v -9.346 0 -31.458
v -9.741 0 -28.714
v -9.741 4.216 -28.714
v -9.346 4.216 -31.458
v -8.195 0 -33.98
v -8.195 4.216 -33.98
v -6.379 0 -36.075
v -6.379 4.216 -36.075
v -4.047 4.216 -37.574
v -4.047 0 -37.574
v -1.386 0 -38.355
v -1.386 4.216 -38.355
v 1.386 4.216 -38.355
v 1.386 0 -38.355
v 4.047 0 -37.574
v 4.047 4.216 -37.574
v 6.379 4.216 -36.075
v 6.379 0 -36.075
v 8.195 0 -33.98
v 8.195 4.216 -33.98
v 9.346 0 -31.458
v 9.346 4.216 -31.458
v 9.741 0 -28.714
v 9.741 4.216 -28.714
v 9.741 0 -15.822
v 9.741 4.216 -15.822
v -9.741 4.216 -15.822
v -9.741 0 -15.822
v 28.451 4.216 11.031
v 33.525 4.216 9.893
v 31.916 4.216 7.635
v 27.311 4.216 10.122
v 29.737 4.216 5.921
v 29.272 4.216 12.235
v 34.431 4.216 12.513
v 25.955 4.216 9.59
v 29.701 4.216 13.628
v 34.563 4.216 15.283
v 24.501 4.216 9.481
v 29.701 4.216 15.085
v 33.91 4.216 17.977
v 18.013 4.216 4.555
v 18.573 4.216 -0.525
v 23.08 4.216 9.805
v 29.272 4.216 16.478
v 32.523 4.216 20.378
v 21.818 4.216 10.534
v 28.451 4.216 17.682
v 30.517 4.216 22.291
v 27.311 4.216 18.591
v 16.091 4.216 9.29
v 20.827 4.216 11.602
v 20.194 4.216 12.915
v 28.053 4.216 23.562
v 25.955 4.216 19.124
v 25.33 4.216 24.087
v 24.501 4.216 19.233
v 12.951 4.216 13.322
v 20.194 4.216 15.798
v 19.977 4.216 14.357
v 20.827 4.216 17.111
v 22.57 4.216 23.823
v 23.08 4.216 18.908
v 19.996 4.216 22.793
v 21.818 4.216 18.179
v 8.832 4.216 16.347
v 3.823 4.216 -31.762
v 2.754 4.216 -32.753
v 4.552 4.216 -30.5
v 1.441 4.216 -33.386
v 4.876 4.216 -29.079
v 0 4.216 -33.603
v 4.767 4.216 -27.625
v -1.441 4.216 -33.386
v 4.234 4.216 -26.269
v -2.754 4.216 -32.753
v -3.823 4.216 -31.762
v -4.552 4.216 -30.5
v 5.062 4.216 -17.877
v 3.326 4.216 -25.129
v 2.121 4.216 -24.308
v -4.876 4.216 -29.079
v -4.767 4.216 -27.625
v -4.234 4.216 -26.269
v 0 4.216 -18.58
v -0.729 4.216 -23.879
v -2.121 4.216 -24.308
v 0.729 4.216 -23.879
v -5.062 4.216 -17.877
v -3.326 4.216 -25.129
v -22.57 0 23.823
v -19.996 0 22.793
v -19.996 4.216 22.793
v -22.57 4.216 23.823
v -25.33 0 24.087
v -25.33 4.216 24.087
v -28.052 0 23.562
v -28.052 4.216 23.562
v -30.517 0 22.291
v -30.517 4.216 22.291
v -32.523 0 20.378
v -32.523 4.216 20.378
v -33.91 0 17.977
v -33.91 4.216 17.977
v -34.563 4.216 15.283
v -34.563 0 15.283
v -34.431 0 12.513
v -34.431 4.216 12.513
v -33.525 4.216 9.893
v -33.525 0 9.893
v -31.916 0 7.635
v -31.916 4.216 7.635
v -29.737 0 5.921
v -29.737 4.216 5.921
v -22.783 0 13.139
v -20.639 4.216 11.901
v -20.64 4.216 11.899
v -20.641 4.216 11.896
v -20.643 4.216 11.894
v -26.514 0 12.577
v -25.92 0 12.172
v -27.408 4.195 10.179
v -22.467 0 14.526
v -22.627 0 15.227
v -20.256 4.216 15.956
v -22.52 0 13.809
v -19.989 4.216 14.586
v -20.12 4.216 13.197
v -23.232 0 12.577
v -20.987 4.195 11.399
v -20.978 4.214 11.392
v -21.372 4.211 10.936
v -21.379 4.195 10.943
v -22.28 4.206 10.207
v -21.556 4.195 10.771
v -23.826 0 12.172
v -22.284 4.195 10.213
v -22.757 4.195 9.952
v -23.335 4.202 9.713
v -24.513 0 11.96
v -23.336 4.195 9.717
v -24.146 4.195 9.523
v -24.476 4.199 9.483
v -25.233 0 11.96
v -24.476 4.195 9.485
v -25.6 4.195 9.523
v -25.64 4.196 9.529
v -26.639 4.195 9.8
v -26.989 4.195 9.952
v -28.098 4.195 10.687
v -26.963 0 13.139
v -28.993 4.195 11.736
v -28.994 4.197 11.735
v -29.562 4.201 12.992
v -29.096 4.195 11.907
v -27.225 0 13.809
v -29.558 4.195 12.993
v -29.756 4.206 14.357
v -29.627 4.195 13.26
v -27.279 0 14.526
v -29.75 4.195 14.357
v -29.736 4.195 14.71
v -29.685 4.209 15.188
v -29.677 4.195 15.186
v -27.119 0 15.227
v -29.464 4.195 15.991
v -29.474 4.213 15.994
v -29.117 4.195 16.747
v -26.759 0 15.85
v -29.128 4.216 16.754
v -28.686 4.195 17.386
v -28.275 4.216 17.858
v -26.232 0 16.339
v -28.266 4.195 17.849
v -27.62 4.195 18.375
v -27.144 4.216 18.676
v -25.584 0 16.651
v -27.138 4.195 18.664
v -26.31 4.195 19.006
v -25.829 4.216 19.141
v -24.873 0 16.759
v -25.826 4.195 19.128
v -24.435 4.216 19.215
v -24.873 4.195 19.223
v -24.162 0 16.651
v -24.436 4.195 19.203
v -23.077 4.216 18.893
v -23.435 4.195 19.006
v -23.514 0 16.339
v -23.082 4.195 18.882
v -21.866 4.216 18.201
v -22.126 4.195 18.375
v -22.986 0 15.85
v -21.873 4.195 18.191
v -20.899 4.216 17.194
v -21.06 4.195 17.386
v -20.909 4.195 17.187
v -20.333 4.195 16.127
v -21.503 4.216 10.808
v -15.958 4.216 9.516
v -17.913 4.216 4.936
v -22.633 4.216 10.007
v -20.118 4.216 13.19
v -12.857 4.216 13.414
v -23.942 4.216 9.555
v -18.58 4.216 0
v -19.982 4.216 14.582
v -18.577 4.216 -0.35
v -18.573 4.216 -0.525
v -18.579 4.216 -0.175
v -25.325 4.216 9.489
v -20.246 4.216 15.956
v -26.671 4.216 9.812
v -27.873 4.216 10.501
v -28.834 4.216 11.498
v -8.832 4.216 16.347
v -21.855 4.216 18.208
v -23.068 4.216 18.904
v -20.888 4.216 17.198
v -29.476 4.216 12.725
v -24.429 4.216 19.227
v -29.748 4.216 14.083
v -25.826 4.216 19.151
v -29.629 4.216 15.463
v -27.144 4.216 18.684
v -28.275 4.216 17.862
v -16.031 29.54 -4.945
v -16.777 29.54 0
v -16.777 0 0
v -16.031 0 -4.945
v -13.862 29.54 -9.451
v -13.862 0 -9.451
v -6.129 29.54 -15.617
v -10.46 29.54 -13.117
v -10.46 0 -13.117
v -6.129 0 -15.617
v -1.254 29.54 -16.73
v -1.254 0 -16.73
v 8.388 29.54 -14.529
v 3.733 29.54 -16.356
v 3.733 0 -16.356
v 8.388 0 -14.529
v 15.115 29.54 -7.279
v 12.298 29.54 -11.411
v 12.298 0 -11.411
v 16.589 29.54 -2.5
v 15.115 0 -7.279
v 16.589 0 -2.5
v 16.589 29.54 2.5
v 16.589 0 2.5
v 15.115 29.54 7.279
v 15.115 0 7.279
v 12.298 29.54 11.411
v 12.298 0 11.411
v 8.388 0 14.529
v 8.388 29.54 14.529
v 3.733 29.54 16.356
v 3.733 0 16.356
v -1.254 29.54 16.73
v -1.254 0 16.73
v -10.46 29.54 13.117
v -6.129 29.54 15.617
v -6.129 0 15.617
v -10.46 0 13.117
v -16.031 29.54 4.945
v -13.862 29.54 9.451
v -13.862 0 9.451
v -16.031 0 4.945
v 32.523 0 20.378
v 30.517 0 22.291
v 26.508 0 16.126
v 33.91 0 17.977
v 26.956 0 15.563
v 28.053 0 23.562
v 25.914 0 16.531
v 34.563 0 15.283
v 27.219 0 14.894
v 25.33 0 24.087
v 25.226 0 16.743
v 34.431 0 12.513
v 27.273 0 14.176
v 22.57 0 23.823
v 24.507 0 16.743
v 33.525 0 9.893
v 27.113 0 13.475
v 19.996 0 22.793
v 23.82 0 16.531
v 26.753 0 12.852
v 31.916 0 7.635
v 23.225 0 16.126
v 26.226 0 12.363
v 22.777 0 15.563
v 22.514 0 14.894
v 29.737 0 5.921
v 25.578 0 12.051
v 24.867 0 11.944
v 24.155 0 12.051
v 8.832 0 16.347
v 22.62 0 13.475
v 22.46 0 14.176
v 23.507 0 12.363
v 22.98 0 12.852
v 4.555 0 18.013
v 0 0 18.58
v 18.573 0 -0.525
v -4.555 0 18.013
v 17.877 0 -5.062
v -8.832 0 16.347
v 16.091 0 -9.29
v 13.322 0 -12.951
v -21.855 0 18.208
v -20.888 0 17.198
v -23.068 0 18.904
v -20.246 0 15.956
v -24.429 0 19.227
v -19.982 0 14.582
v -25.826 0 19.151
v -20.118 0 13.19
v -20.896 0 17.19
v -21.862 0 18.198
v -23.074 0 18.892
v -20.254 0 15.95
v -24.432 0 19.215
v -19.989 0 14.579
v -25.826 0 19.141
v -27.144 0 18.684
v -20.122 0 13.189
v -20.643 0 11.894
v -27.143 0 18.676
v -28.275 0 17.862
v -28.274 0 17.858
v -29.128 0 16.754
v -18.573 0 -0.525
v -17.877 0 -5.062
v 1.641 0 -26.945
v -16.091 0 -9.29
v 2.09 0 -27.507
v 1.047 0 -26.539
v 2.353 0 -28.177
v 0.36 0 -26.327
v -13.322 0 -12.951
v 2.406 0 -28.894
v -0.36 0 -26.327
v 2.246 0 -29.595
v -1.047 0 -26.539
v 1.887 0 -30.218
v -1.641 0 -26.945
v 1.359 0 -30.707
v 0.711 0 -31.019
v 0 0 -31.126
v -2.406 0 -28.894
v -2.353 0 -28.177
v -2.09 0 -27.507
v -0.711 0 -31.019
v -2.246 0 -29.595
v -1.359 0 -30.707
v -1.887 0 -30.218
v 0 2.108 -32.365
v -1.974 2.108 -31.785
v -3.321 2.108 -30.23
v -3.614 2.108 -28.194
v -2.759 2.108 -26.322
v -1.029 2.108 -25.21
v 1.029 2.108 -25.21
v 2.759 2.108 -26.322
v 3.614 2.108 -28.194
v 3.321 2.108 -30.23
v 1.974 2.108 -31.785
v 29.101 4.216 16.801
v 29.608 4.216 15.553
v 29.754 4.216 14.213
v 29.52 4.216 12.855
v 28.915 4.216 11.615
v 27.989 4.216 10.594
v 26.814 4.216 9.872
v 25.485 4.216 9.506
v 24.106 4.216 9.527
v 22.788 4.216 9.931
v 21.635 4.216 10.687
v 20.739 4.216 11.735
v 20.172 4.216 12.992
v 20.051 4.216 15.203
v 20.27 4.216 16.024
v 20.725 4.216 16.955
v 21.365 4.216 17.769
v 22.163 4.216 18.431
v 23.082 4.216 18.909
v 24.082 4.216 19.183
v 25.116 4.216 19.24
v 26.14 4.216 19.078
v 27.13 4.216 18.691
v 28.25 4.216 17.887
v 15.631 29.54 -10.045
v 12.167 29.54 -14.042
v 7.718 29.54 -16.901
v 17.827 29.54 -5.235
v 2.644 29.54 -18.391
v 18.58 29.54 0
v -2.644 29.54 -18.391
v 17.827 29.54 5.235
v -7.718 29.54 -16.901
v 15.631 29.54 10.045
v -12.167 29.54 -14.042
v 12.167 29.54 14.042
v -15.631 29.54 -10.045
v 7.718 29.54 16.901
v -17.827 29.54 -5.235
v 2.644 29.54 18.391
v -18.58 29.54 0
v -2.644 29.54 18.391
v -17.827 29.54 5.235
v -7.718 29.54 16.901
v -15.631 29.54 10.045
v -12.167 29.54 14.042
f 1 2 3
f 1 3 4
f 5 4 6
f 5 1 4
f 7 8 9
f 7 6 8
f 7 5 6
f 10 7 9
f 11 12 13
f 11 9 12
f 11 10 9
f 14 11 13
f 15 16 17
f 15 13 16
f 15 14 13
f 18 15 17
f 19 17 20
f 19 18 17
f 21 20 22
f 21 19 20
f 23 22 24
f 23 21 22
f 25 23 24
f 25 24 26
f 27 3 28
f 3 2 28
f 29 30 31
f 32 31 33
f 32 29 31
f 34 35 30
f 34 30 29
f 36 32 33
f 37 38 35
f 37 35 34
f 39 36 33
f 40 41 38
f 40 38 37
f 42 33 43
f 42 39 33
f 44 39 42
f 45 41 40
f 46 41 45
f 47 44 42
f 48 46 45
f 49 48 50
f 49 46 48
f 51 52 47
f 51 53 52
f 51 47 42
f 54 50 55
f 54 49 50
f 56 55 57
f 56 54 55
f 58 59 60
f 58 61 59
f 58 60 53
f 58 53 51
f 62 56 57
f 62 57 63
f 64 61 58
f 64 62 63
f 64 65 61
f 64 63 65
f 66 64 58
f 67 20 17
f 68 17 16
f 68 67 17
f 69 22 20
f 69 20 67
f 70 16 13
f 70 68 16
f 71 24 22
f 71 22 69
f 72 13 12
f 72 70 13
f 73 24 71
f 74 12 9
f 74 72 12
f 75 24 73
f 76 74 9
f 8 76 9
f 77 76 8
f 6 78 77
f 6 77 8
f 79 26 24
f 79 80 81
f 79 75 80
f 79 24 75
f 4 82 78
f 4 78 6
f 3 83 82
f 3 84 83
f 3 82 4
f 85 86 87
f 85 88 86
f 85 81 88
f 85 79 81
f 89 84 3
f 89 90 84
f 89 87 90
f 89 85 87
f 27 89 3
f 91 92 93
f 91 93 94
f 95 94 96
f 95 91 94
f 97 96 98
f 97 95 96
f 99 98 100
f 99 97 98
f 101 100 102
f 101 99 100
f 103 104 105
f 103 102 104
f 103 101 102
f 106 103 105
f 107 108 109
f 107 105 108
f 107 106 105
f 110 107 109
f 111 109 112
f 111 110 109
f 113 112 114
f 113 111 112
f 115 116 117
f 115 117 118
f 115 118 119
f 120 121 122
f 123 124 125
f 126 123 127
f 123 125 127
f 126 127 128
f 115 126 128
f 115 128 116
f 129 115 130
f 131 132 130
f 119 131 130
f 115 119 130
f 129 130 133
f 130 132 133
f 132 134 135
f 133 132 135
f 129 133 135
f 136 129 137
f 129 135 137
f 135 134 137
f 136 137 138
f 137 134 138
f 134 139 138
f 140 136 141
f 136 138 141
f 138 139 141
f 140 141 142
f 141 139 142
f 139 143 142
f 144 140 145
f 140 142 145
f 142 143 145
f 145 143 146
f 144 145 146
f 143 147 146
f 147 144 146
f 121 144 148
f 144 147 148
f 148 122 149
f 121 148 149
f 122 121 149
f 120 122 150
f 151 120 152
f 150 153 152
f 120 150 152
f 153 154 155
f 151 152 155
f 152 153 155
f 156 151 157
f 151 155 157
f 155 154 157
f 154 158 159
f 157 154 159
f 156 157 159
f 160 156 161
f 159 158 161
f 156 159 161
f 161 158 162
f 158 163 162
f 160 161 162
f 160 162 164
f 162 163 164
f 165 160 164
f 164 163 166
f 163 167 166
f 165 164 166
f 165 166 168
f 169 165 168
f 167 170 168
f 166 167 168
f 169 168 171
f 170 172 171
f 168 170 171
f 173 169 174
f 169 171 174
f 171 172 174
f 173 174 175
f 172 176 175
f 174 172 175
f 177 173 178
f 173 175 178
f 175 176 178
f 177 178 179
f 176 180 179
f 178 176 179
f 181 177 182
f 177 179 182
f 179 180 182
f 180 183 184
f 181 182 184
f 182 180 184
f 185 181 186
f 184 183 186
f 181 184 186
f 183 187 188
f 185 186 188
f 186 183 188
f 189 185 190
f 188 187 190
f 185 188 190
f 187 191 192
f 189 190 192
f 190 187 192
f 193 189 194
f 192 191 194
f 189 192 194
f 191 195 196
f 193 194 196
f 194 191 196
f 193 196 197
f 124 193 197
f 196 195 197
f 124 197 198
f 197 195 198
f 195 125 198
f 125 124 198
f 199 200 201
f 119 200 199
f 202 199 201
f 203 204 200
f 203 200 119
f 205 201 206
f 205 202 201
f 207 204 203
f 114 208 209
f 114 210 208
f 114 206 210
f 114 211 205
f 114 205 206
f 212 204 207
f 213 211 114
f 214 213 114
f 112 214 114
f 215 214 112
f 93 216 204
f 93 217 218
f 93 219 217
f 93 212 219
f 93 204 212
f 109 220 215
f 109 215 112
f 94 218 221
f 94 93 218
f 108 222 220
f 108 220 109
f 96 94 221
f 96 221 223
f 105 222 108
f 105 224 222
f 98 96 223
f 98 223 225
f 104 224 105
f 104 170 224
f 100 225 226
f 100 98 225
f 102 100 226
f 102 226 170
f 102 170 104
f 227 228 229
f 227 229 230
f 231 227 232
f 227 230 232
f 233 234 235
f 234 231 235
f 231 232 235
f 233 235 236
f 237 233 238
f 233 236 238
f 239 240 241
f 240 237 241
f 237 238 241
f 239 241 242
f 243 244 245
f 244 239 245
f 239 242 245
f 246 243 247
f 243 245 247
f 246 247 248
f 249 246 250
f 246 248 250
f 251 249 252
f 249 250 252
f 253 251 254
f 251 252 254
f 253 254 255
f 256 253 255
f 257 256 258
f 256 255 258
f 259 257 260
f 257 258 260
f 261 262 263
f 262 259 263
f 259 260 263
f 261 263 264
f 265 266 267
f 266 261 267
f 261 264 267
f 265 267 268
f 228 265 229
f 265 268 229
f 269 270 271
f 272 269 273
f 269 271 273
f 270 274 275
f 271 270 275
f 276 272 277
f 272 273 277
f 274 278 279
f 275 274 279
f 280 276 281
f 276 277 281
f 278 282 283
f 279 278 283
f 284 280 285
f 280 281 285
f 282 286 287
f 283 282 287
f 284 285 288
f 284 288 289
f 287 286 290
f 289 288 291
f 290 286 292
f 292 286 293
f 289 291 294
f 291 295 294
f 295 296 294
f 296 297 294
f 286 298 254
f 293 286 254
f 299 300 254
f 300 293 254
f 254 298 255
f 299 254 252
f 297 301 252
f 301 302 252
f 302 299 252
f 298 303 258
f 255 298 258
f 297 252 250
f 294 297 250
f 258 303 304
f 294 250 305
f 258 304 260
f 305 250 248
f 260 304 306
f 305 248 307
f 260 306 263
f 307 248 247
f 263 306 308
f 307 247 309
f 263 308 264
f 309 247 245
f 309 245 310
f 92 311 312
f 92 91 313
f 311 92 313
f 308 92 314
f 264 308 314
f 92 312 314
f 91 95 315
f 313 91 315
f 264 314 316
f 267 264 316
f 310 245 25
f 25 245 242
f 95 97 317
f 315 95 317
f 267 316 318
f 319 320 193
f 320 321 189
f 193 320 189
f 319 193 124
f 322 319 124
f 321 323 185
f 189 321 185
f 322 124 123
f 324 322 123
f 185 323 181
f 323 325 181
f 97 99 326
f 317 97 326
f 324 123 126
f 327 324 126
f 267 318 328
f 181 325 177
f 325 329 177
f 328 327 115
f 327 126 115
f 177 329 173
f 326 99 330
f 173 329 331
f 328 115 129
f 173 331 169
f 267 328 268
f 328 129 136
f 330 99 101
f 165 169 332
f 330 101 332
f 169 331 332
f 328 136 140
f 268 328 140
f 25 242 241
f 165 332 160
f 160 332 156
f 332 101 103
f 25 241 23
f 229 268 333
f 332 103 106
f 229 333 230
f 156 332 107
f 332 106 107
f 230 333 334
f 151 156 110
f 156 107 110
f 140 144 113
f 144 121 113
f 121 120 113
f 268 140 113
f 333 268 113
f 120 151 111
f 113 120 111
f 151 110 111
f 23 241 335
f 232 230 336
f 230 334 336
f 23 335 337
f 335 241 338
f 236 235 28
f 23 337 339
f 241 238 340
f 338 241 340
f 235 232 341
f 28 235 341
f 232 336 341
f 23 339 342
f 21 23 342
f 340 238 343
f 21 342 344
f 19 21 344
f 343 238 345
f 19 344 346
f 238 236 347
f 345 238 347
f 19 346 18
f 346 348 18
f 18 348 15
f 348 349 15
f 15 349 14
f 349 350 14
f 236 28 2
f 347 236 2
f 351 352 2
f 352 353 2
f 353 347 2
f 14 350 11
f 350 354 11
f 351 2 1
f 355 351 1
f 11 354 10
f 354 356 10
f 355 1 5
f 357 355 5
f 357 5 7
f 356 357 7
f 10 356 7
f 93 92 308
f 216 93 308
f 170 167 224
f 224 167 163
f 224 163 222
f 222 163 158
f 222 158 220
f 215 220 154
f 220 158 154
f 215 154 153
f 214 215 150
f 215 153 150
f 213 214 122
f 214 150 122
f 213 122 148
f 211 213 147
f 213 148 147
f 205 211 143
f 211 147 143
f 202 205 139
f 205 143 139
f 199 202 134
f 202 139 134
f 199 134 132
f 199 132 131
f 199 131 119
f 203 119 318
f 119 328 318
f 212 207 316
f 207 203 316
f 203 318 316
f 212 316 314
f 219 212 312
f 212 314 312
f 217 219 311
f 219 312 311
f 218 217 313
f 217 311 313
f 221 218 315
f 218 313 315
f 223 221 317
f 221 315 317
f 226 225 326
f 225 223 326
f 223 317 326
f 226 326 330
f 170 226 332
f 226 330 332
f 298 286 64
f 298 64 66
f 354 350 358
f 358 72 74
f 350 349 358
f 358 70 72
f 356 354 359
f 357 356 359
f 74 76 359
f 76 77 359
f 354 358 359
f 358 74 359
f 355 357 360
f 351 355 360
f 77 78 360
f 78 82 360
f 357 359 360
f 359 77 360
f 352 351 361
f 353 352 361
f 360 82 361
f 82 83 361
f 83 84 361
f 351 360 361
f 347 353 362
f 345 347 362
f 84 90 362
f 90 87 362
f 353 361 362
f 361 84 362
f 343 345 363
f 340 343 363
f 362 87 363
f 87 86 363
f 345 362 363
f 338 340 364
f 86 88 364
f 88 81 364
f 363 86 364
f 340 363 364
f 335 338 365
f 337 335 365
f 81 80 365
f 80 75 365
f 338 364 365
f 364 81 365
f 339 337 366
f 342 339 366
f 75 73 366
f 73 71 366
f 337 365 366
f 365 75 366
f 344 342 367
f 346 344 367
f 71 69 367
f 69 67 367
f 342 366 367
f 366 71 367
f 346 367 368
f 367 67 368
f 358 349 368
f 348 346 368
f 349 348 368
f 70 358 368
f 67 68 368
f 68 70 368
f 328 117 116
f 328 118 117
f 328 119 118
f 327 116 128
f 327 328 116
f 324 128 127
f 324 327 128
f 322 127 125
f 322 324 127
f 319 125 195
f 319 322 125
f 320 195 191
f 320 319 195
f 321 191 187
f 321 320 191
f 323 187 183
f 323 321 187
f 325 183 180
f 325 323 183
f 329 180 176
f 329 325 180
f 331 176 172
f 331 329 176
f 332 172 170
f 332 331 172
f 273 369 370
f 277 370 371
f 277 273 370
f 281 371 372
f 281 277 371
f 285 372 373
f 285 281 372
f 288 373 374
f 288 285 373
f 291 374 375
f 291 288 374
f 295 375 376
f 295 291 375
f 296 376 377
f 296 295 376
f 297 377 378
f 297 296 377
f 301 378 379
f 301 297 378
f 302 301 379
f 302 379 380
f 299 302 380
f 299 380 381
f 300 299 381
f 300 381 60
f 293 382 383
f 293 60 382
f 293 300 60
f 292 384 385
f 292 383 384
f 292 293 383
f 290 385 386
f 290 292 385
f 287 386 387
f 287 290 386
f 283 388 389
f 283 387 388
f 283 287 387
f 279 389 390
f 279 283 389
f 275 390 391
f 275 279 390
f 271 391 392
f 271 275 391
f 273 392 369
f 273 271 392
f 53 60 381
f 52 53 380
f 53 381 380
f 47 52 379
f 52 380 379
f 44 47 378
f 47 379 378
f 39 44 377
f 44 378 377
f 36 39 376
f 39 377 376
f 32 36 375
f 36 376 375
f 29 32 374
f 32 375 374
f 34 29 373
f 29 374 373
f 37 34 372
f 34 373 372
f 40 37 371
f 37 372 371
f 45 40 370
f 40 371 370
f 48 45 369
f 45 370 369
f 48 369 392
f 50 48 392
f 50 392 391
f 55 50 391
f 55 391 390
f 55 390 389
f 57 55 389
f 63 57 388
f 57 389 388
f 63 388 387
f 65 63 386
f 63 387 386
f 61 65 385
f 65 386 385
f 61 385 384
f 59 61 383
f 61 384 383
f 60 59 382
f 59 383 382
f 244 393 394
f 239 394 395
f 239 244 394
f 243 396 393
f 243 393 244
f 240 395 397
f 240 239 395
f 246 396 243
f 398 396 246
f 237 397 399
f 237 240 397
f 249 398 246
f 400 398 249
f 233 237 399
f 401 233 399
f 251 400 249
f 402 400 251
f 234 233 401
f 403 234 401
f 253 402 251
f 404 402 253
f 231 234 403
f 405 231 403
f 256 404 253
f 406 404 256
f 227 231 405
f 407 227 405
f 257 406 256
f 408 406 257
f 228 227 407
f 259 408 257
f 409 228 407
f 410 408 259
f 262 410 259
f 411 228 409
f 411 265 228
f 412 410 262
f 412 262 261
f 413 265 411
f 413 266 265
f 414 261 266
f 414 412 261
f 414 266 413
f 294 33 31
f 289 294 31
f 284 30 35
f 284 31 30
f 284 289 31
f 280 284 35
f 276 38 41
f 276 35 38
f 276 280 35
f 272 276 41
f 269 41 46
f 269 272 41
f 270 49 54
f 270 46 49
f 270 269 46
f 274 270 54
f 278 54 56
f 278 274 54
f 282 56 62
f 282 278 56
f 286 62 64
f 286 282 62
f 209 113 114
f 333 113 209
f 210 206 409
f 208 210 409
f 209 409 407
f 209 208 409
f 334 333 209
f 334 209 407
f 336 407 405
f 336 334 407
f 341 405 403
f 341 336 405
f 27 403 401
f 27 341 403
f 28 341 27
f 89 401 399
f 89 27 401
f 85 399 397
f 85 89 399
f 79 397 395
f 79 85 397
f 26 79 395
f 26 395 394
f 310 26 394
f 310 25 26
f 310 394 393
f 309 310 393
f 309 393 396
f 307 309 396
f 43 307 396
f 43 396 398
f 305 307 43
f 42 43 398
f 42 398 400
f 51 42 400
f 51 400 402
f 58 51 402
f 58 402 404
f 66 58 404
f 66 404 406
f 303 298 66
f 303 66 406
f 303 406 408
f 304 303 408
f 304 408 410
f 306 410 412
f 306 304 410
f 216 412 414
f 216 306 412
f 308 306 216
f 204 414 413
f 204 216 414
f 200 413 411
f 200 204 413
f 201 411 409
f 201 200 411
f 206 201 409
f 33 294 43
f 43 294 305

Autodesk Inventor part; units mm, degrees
ref_plane "YZ Plane" through (0, 0, 0) normal (1, 0, 0) x (0, 1, 0)
ref_plane "XZ Plane" through (0, 0, 0) normal (0, 1, 0) x (-1, 0, 0)
sketch "Sketch1" plane through (0, 0, 0) normal (0, 1, 0) x (-1, 0, 0)
  circle A0 centre (0, 0) radius 16.7767
  circle A1 centre (0, 0) radius 18.5801
  circle A2 centre (-24.8666, 14.3567) radius 2.413
  circle A3 centre (-24.8666, 14.3567) radius 4.8895
  line L0 (-29.7371, 5.9209) -> (-18.5727, -0.5249)
  line L1 (-19.9962, 22.7926) -> (-8.8318, 16.3469)
  arc A4 (-19.9962, 22.7926) -> (-29.7371, 5.9209) centre (-24.8666, 14.3567) ccw
  circle A5 centre (0, -28.7135) radius 2.413
  circle A6 centre (0, -28.7135) radius 4.8895
  line L2 (-9.7409, -28.7135) -> (-9.7409, -15.822)
  arc A7 (-9.7409, -28.7135) -> (9.7409, -28.7135) centre (0, -28.7135) ccw
  line L3 (9.7409, -28.7135) -> (9.7409, -15.822)
  circle A8 centre (24.8666, 14.3567) radius 2.413
  circle A9 centre (24.8666, 14.3567) radius 4.8895
  line L4 (29.7371, 5.9209) -> (18.5727, -0.5249)
  arc A10 (29.7371, 5.9209) -> (19.9961, 22.7926) centre (24.8666, 14.3567) ccw
  line L5 (19.9961, 22.7926) -> (8.8318, 16.3469)
  point P0 (0, 14.3567)
  point P1 (-16.0908, 9.29)
extrude "Extrusion1" add sketch "Sketch1" along normal blind 29.5402 contours A1
extrude "Extrusion2" add sketch "Sketch1" along normal blind 4.2164 contours A1 L0 A4 L1
extrude "Extrusion3" add sketch "Sketch1" along normal blind 4.2164 contours A1 L5 A10 L4
extrude "Extrusion4" add sketch "Sketch1" along normal blind 4.2164 contours L3 A7 L2 A1
sketch "Sketch2" plane through (0, 4.2164, 0) normal (0, 1, 0) x (1, 0, 0)
  arc A0 (-29.7371, -5.9209) -> (-19.9961, -22.7926) centre (-24.8666, -14.3567) ccw projected
  line L0 (-19.9961, -22.7926) -> (-8.8318, -16.3469) projected
  arc A1 (-18.5727, 0.5249) -> (-8.8318, -16.3469) centre (0, 0) ccw projected
  line L1 (-18.5727, 0.5249) -> (-29.7371, -5.9209) projected
  circle A2 centre (24.8666, -14.3567) radius 4.8895 projected
  circle A3 centre (0, 28.7135) radius 4.8895 projected
  arc A4 (9.7409, 28.7135) -> (-9.7409, 28.7135) centre (0, 28.7135) ccw projected
  line L2 (9.7409, 15.822) -> (9.7409, 28.7135) projected
  line L3 (-9.7409, 28.7135) -> (-9.7409, 15.822) projected
  circle A5 centre (0, 28.7135) radius 2.413 projected
  line L4 (29.7371, -5.9209) -> (18.5727, 0.5249) projected
  arc A6 (19.9962, -22.7926) -> (29.7371, -5.9209) centre (24.8666, -14.3567) ccw projected
  circle A7 centre (24.8666, -14.3567) radius 2.413 projected
  line L5 (8.8318, -16.3469) -> (19.9962, -22.7926) projected
  circle A8 centre (0, 0) radius 18.5801 projected
  circle A9 centre (0, 0) radius 16.7767 projected
ref_plane "Work Plane1" through (-13.7086, 0, 7.9) normal (0.5, 0, 0.866) x (0.866, 0, -0.5)
sketch "Sketch3" plane through (-13.7086, 0, 7.9) normal (0.5, 0, 0.866) x (0.866, 0, -0.5)
  line L0 (-10.4785, 0) -> (-15.3045, 0) projected
  line L1 (-10.4785, 0) -> (-8.002, 4.2164)
  line L2 (-8.002, 4.2164) -> (-8.002, 0)
  line L3 (-8.002, 0) -> (-8.002, 4.2164) projected
  line L4 (-8.002, 0) -> (-10.4785, 0)
  line L5 (-12.8915, 0) -> (-12.8915, 4.2164) projected
  line L6 (-12.8915, 0) -> (-12.8915, 8.5631)
  point P0 (15.822, 0)
revolve "Revolution1" add sketch "Sketch3" angle 360 about axis through (-24.8729, 0, 14.3457) along (0, 1, 0)
ref_plane "Work Plane2" through (0, 0, 0) normal (0.5, 0, -0.866) x (0, 1, 0)
sketch "Sketch4" plane through (0, 0, 0) normal (0.5, 0, -0.866) x (0, 1, 0)
  line L0 (0, 26.3005) -> (0, 31.1265) projected
  line L1 (4.2164, 33.603) -> (4.2164, 23.824) projected
  line L2 (4.2164, 33.603) -> (0, 31.1265)
  line L3 (0, 23.824) -> (0, 33.603) projected
  line L4 (0, 31.1265) -> (0, 33.603)
  line L5 (0, 33.603) -> (4.2164, 33.603)
  line L6 (0, 28.7135) -> (10.3946, 28.7135)
  point P0 (0, 0)
revolve "Revolution2" add sketch "Sketch4" angle 360 about axis through (24.8666, 0, 14.3567) along (0, 1, 0) contours L3 L5 L2
ref_plane "Work Plane3" through (0, 0, 0) normal (-1, 0, 0) x (0, 1, 0)
sketch "Sketch5" plane through (0, 0, 0) normal (-1, 0, 0) x (0, 1, 0)
  line L0 (0, 26.3005) -> (0, 31.1265) projected
  line L1 (4.2164, 33.603) -> (4.2164, 23.824) projected
  line L2 (0, 31.1265) -> (4.2164, 33.603)
  line L3 (0, 23.824) -> (0, 33.603) projected
  line L4 (4.2164, 33.603) -> (0, 33.603)
  line L5 (0, 33.603) -> (0, 31.1265)
  line L6 (0, 28.7135) -> (13.6215, 28.7135)
  point P0 (0, 0)
revolve "Revolution3" add sketch "Sketch5" angle 360 about axis through (0, 0, -28.7135) along (0, 1, 0) contours L3 L4 L2
properties part number "Wood Mount 1 Inch"
